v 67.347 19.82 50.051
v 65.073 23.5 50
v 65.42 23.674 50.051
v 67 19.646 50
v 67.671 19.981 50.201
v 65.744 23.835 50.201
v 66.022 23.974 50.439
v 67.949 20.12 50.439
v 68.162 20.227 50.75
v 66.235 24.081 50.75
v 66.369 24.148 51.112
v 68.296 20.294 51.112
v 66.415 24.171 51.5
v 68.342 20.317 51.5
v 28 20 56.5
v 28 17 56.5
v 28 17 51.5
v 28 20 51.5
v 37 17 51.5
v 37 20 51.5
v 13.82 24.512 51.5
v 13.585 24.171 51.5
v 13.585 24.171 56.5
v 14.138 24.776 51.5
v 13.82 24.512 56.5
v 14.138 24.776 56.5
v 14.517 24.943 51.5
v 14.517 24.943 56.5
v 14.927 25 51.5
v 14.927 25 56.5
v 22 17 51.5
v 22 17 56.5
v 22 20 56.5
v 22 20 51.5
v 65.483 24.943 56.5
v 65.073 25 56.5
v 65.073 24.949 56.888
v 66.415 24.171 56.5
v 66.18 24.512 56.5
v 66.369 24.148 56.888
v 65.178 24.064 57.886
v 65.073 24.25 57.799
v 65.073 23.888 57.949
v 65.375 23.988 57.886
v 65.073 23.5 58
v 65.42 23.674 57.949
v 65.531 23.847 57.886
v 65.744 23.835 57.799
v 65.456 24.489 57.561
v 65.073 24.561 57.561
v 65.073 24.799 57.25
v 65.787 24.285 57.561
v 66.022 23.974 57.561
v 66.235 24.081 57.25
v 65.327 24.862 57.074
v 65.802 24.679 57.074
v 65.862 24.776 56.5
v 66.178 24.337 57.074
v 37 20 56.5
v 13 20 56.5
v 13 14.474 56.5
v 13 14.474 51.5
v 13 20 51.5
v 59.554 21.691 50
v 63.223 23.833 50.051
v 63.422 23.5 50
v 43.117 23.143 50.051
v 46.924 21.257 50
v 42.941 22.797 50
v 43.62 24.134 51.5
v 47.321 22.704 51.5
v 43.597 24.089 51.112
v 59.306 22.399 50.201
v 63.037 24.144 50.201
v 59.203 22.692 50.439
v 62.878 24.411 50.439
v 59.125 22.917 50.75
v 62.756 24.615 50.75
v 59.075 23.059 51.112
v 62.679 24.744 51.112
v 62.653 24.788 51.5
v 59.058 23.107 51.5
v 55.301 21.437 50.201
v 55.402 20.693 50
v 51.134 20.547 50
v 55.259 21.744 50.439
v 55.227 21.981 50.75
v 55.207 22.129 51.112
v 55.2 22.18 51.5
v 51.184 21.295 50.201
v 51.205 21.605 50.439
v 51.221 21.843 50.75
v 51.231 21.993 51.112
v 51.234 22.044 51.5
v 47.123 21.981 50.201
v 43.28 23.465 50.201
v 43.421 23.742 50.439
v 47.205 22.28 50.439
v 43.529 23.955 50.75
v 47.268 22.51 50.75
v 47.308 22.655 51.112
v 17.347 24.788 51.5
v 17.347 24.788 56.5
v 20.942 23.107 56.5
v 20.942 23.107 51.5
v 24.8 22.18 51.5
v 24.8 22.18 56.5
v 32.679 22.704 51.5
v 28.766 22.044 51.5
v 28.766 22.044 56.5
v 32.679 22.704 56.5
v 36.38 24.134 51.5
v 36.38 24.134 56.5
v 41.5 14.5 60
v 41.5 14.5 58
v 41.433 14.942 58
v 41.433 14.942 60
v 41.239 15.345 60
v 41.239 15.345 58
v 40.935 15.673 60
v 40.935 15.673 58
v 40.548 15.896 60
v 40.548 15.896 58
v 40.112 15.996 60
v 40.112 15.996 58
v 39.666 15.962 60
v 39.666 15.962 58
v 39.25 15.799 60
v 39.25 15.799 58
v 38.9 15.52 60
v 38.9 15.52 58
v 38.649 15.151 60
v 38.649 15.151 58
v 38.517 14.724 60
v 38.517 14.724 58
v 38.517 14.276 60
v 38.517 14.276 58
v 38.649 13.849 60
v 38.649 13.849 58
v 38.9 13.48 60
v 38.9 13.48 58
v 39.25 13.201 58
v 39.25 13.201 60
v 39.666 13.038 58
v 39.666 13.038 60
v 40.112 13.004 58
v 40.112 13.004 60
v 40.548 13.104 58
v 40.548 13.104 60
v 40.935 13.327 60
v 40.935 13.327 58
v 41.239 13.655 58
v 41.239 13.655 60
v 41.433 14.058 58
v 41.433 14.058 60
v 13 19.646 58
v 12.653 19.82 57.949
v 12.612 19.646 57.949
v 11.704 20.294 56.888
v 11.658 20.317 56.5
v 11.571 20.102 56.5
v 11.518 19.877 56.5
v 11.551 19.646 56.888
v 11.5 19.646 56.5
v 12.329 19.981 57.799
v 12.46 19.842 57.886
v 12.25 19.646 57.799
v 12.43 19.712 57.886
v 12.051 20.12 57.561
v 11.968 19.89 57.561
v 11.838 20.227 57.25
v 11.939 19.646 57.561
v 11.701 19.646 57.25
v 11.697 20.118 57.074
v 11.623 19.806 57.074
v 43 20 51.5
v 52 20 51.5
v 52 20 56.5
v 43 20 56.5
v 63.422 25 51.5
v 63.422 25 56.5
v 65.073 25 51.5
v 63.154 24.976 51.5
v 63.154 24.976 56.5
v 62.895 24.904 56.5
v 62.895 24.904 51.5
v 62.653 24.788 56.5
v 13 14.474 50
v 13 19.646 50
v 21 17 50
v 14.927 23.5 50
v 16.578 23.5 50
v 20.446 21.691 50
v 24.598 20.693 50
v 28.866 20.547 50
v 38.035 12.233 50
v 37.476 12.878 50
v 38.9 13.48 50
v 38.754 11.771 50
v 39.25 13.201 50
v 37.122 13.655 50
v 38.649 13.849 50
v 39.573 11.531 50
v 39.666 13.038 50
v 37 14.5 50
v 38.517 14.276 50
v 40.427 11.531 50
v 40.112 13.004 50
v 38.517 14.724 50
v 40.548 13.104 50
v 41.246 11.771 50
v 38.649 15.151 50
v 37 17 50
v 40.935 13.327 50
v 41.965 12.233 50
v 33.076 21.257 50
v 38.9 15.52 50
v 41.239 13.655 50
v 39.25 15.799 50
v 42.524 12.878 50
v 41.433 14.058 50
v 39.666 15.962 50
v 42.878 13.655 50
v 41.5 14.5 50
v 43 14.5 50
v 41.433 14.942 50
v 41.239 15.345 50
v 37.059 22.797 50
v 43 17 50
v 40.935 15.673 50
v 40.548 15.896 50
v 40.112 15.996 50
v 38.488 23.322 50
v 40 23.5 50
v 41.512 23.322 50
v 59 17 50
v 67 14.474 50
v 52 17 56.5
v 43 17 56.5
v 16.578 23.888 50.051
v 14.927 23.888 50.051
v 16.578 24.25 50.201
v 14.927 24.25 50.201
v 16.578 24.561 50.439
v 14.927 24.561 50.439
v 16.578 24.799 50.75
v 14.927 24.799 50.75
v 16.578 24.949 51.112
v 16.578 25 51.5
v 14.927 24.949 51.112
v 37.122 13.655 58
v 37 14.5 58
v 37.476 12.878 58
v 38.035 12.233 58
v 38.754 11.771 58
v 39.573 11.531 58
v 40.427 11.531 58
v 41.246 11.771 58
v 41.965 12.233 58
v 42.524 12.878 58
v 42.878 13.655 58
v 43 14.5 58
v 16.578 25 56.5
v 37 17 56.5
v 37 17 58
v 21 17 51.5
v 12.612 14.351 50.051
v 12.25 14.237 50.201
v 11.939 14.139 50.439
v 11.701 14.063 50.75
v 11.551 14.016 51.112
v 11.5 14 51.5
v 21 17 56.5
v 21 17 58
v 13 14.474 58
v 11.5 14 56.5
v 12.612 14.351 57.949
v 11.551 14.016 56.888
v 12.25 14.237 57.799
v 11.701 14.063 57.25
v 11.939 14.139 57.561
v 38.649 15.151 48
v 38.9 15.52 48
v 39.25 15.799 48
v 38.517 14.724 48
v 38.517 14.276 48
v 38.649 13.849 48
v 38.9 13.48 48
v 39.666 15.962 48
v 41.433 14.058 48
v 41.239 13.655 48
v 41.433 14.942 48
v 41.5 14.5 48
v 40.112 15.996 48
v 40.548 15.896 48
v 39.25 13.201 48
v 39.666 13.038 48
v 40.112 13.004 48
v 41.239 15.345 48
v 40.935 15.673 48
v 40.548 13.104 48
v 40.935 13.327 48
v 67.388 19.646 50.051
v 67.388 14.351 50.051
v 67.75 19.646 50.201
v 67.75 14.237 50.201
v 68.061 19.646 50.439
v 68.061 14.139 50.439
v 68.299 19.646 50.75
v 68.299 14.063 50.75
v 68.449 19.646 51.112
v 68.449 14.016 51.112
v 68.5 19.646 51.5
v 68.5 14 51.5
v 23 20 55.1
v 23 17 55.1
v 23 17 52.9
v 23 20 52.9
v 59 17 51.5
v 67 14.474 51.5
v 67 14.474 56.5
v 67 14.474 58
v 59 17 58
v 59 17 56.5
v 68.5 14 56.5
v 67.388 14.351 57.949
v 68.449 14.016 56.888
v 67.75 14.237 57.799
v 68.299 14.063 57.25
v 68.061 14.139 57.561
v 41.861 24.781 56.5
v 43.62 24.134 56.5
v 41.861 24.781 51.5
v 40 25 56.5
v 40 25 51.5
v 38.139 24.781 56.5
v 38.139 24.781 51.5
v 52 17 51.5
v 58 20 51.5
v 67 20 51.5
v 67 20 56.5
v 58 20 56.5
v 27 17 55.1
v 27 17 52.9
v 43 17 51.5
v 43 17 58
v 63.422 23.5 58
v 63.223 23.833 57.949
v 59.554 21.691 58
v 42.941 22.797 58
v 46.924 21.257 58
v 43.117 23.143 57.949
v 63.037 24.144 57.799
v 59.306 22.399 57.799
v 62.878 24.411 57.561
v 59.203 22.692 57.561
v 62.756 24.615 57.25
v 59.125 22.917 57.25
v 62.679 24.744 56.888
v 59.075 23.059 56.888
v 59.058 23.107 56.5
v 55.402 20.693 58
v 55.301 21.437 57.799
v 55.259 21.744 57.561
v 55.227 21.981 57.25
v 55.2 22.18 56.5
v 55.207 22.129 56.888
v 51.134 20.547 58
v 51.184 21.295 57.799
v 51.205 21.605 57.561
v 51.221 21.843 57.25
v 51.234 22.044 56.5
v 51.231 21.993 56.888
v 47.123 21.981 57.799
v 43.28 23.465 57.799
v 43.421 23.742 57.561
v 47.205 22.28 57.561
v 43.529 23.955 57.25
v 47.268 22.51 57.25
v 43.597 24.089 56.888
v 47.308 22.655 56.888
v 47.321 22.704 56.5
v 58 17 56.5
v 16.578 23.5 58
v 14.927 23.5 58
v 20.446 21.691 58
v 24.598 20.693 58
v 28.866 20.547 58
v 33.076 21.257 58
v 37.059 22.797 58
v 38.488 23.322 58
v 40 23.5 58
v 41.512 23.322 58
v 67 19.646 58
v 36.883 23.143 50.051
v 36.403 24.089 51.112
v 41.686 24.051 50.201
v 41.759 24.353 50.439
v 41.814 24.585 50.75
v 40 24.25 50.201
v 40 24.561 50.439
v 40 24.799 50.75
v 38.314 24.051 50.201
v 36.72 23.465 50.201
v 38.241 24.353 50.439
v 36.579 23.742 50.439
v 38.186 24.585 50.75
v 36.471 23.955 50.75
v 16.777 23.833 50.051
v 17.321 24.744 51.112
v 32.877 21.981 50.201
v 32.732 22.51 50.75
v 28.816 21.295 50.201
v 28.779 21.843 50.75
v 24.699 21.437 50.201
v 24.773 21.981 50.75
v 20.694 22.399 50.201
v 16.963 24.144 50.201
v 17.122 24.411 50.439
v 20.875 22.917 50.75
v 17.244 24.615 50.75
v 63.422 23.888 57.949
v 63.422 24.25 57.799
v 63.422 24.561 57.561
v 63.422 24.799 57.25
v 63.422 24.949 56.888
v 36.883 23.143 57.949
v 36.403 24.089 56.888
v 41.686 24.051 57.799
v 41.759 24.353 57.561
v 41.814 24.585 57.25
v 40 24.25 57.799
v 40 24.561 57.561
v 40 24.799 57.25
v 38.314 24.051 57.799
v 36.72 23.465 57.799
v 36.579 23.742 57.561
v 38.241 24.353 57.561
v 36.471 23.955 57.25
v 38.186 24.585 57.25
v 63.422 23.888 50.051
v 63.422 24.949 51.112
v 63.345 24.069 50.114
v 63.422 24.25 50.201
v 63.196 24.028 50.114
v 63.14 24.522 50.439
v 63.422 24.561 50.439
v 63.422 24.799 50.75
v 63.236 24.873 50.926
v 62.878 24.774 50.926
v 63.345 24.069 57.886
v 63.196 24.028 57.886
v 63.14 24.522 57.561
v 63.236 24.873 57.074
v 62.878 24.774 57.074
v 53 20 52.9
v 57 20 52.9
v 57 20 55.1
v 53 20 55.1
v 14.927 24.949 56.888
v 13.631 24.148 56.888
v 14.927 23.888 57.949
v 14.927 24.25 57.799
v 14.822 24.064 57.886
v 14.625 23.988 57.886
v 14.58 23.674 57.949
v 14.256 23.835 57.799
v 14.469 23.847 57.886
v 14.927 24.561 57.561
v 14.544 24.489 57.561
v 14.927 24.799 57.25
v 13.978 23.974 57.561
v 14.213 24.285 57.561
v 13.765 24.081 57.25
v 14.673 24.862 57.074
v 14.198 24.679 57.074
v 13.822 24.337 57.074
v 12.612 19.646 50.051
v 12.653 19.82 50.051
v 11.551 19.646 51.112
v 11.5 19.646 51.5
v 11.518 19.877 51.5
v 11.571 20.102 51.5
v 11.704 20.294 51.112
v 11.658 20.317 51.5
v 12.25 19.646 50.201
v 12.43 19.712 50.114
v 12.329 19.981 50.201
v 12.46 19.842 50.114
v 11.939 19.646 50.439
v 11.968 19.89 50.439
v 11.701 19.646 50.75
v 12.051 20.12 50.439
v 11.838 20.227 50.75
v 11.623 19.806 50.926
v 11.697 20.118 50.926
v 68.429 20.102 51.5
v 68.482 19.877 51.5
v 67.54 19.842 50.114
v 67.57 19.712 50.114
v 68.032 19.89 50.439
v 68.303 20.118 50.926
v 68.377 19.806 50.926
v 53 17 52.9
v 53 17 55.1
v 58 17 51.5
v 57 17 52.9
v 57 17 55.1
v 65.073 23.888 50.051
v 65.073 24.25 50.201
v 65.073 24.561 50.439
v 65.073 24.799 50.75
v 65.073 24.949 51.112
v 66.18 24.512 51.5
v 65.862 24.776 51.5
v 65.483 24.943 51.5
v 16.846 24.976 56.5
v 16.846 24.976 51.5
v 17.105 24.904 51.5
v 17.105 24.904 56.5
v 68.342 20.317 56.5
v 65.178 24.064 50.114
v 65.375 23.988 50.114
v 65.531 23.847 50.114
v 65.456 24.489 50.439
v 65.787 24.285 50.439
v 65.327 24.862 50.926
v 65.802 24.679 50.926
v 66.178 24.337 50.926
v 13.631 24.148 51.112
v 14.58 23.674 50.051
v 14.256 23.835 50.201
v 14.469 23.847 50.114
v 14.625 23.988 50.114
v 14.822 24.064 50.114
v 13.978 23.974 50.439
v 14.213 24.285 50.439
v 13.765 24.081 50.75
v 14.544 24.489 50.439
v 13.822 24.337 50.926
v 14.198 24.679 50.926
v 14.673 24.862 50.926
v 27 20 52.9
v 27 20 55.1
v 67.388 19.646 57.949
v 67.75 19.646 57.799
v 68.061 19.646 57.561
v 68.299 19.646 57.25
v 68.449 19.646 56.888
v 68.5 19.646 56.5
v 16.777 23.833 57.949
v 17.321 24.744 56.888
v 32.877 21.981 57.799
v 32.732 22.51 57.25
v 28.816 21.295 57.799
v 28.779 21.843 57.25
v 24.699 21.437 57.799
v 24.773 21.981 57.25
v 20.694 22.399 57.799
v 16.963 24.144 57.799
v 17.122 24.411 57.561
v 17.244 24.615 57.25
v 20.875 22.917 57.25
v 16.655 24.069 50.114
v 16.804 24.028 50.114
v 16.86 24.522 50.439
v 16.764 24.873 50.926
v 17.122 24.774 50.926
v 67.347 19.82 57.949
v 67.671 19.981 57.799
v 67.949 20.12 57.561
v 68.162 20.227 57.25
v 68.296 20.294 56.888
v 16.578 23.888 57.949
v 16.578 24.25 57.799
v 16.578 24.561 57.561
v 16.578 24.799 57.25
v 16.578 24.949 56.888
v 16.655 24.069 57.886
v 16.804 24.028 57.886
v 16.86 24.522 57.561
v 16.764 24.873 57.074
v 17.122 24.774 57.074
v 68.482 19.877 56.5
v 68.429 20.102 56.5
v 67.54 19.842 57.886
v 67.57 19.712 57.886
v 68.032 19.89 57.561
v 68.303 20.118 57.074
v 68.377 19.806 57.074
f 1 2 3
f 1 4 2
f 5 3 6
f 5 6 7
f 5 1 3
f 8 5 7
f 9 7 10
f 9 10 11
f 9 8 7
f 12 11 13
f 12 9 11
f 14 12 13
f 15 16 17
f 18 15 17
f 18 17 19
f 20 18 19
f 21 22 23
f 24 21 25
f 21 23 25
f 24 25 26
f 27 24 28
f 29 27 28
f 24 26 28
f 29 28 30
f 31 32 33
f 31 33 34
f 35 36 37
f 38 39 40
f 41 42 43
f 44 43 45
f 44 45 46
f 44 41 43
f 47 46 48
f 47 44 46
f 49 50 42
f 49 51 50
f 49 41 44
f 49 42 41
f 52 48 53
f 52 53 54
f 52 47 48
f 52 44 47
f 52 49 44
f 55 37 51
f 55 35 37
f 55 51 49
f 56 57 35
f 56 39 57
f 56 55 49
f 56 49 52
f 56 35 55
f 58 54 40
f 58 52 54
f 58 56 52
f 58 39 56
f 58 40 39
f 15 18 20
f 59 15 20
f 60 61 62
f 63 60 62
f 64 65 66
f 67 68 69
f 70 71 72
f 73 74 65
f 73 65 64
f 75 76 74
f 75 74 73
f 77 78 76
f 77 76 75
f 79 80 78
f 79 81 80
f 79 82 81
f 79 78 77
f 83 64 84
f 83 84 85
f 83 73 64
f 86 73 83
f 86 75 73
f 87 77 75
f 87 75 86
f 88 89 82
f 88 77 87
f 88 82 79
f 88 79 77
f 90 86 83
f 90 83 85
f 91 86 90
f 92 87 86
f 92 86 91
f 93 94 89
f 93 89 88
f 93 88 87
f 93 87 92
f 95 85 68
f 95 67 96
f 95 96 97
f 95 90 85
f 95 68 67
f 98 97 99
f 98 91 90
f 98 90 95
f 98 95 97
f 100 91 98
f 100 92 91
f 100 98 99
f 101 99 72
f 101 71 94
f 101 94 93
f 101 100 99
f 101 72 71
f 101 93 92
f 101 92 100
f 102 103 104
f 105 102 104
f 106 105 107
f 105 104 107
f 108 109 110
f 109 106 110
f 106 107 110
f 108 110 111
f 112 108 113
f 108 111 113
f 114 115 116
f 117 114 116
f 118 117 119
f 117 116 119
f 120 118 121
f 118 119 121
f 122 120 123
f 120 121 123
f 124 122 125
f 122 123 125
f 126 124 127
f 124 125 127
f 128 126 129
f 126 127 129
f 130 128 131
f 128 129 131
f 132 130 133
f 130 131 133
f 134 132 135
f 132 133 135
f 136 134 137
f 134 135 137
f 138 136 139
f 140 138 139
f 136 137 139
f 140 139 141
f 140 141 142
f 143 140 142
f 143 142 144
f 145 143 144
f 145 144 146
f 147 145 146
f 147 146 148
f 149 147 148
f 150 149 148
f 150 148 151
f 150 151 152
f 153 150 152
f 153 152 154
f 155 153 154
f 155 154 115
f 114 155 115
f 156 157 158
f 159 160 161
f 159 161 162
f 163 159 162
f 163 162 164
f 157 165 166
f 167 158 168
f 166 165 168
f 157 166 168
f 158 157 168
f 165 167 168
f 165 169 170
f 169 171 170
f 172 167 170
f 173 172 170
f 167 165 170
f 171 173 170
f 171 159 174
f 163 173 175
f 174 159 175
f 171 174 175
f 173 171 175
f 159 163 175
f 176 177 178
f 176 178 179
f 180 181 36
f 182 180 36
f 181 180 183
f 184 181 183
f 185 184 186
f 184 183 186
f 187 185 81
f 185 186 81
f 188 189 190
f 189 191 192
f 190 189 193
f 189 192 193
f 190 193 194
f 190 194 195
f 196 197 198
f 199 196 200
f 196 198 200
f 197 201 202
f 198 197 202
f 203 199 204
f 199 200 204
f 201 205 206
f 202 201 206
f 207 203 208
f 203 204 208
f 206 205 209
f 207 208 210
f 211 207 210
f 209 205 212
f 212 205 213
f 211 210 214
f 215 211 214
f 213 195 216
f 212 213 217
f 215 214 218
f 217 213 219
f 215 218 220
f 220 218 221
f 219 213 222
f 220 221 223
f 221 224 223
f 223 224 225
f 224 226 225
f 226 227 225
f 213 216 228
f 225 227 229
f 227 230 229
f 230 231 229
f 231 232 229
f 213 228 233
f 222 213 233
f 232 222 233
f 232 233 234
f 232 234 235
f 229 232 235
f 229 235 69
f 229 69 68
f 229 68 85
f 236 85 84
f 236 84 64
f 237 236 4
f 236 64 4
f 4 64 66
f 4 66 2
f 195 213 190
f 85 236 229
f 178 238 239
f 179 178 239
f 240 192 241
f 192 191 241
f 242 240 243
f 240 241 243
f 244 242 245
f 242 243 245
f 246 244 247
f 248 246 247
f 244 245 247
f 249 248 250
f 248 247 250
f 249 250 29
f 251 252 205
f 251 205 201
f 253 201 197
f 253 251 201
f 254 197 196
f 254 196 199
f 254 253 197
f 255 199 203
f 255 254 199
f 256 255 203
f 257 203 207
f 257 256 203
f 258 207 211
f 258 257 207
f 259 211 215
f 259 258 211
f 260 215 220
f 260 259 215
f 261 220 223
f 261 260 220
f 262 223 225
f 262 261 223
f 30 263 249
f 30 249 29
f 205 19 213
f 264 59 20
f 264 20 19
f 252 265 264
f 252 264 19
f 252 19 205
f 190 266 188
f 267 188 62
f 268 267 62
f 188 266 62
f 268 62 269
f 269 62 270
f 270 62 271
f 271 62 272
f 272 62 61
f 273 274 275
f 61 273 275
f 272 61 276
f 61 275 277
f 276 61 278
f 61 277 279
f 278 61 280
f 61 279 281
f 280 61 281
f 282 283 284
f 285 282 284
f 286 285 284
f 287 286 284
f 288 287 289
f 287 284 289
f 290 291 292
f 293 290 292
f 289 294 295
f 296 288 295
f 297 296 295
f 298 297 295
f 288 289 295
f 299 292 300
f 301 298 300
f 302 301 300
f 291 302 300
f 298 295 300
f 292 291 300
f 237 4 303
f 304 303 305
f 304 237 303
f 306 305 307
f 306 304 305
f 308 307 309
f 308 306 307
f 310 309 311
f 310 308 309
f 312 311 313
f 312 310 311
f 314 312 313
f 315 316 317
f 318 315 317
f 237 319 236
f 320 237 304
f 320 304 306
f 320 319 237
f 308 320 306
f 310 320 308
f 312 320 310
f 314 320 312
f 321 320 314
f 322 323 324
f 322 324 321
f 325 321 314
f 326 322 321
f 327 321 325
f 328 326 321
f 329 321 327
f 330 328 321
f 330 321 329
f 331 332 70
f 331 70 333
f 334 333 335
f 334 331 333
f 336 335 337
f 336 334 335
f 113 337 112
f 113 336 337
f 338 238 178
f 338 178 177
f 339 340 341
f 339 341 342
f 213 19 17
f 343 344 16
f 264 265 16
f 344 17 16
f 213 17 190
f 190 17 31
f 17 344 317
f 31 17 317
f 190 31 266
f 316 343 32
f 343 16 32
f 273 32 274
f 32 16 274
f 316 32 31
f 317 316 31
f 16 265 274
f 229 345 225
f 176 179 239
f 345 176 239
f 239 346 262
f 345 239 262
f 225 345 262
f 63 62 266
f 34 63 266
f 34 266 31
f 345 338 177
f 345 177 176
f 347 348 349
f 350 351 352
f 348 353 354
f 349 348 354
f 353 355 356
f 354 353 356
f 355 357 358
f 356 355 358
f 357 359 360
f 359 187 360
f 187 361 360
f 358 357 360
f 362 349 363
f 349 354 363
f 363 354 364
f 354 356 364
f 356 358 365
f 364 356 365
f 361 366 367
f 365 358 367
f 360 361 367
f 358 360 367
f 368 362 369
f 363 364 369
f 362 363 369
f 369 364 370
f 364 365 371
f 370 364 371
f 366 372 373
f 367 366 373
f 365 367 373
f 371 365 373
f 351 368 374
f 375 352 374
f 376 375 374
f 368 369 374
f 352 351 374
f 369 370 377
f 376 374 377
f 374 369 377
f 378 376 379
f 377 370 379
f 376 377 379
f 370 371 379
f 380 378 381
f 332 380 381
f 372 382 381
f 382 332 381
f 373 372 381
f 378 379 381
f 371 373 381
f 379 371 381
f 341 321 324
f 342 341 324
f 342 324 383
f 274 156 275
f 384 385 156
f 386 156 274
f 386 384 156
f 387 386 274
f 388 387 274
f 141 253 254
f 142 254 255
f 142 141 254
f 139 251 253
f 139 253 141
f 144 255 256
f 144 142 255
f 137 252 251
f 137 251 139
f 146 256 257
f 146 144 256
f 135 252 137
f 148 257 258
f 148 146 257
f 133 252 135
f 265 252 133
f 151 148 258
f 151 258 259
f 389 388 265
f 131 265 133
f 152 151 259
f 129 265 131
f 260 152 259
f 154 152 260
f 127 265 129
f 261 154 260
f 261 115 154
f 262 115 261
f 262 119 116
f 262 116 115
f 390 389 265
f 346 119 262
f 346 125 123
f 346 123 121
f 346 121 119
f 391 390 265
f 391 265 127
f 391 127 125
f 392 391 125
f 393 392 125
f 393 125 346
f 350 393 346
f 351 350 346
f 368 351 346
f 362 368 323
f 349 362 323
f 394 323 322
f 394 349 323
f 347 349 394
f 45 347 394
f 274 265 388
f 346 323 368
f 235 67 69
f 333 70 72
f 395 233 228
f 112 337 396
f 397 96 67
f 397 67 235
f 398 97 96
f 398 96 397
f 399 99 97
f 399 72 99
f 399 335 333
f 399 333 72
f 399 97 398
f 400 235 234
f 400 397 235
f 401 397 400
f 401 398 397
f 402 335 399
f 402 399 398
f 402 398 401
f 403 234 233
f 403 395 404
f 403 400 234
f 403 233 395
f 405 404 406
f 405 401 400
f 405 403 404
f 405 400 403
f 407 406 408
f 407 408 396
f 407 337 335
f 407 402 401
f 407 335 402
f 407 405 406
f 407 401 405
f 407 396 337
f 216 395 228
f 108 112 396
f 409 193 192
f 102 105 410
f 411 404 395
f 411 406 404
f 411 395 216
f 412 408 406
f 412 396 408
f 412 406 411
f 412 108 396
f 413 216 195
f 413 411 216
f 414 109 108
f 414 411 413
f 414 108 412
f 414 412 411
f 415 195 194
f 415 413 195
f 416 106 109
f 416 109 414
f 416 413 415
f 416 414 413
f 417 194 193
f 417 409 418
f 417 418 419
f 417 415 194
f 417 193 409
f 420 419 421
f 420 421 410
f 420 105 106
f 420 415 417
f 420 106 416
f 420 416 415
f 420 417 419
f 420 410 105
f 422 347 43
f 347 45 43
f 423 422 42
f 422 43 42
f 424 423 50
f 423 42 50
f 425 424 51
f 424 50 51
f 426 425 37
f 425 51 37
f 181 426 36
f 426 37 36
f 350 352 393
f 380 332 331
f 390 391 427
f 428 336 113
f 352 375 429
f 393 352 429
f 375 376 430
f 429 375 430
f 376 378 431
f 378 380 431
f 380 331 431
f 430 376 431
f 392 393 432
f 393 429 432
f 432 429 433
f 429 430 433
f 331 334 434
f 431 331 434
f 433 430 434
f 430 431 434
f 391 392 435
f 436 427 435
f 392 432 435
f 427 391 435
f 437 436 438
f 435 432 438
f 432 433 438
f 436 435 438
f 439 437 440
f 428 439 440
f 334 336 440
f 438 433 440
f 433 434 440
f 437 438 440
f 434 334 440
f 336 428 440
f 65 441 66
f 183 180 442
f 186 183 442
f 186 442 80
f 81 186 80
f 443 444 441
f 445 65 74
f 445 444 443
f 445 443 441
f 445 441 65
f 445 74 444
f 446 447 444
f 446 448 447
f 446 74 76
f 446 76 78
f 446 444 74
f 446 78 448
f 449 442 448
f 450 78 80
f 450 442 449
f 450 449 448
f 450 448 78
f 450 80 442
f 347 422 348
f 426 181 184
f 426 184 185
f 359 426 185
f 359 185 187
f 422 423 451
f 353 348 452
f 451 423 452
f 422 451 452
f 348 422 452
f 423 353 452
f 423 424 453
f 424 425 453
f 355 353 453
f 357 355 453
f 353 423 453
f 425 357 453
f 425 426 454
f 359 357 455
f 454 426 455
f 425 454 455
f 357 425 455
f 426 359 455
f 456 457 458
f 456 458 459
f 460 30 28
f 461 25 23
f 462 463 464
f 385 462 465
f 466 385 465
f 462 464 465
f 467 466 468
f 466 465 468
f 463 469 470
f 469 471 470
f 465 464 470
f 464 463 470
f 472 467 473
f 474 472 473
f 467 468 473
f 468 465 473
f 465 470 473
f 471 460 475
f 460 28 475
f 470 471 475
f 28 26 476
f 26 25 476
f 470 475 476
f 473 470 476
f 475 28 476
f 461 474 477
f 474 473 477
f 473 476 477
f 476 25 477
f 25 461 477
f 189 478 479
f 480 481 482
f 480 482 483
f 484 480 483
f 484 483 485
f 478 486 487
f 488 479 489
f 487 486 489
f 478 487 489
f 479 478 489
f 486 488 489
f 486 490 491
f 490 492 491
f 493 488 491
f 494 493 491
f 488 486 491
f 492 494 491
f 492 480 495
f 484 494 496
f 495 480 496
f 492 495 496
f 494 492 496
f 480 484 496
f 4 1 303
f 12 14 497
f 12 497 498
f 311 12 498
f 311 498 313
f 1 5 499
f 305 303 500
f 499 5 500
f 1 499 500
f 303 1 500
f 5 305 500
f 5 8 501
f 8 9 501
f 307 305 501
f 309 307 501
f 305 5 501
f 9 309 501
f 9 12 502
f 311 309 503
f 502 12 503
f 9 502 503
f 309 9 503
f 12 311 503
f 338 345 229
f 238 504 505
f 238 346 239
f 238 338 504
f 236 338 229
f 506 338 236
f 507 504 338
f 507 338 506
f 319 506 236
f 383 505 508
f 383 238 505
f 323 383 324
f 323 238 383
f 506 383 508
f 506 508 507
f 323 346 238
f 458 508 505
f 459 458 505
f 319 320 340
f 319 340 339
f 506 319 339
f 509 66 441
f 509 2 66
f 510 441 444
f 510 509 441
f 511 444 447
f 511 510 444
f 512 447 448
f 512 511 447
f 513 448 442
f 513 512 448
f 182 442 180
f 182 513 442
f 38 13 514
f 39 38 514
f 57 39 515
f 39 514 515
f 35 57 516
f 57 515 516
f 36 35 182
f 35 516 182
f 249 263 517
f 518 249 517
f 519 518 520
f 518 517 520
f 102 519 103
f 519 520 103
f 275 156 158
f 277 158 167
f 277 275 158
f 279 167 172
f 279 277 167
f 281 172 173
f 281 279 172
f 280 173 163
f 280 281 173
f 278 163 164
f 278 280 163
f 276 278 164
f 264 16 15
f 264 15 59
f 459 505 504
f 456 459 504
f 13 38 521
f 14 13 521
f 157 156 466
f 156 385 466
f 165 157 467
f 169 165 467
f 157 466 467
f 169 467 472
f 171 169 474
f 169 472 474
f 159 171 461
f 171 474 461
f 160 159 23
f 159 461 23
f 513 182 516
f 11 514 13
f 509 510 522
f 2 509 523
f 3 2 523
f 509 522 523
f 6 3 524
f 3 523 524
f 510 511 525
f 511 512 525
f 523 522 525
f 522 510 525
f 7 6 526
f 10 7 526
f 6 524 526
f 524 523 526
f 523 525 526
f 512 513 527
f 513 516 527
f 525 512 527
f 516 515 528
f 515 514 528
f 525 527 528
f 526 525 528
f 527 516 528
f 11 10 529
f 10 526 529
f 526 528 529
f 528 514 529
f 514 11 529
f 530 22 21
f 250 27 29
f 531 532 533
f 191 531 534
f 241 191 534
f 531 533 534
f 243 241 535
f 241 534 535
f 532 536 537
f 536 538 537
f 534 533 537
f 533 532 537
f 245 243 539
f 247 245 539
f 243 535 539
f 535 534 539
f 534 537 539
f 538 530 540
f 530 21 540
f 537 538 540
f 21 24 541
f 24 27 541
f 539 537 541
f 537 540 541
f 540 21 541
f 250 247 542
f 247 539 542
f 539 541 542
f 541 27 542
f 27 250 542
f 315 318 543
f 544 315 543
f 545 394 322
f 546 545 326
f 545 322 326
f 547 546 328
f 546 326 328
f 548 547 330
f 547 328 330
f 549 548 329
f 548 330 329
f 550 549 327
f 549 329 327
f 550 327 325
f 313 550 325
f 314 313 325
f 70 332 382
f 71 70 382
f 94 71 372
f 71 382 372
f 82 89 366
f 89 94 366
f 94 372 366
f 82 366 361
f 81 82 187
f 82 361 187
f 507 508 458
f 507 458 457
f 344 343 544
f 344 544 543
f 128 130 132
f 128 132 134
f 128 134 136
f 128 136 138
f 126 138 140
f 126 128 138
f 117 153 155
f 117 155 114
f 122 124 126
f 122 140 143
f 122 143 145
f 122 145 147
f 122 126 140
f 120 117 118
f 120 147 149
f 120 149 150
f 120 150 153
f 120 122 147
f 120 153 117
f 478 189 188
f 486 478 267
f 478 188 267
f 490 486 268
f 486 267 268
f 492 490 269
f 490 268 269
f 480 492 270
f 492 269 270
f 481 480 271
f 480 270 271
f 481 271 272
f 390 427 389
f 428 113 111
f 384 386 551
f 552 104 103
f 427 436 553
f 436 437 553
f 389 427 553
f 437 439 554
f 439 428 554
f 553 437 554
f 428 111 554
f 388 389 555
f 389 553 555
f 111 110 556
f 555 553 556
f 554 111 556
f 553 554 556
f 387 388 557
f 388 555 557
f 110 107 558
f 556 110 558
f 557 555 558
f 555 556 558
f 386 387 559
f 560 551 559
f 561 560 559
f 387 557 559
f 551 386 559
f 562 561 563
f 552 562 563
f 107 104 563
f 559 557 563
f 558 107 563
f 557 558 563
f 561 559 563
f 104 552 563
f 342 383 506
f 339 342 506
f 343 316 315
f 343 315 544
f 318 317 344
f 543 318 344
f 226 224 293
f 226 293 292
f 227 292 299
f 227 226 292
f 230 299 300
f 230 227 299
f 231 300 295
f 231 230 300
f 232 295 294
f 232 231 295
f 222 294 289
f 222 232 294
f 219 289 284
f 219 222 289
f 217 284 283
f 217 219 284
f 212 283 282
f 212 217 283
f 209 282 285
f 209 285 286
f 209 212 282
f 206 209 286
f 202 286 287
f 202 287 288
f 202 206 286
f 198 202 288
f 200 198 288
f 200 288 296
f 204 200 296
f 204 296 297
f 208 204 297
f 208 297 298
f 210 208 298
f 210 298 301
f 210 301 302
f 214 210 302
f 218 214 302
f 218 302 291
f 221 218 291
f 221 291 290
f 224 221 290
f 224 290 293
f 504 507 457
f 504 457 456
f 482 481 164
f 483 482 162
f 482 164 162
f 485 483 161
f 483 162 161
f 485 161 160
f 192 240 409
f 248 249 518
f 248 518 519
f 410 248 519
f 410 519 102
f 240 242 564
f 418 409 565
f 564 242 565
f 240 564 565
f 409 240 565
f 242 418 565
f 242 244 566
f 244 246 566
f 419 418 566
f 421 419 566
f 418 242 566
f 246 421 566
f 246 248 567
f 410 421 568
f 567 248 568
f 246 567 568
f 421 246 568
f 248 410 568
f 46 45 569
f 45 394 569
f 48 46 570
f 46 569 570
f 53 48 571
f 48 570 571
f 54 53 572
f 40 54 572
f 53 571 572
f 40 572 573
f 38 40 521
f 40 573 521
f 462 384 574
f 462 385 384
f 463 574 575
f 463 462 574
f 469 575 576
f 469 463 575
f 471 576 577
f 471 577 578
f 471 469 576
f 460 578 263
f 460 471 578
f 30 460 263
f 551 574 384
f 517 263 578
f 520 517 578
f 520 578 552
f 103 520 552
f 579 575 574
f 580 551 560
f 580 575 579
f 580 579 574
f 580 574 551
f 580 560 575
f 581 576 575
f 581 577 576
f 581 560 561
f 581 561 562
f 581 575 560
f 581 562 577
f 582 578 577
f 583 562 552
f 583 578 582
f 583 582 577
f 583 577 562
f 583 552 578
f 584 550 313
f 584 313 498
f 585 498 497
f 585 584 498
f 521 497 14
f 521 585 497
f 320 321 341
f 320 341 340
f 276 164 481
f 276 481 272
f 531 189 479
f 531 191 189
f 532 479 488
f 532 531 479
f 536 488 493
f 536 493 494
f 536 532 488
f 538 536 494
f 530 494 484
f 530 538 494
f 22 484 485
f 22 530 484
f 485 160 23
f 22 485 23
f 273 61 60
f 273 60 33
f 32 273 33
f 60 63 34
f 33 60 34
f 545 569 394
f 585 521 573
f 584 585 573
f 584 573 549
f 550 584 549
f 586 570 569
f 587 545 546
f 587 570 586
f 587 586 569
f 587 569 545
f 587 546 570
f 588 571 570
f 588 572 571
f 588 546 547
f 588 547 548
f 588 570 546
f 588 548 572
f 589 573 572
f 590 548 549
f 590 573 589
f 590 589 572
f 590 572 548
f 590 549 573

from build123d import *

# Parameters (mm, degrees)
PAD060_DEPTH            = 4
CYLINDER_R              = 1.5
CYLINDER_DEPTH          = 6
SKETCH098_W             = 9
SKETCH098_H             = 5
SKETCH098_W_2           = 4
SKETCH098_H_2           = 2.2
POCKET027_DEPTH         = 6
FILLET003_R             = 1.5
BODY091_PLACEMENT_ANGLE = 90


with BuildPart() as part:
    # Sketch097 → Pad060 (new body, symmetric)
    with BuildSketch(Plane.XZ):
        with BuildLine():
            ThreePointArc((3.619641, 7.134297), (0, 8), (-3.619641, 7.134297))
            ThreePointArc((-23, 8), (-13.423615, 5.019648), (-3.619641, 7.134297))
            Line((-23, 8), (-26, 8))
            Line((-28.5, 3), (-26, 8))
            Line((-28.5, 3), (-28.5, -3))
            Line((-19, 0), (-28.5, -3))
            Line((-3, 0), (-19, 0))
            Line((-3, 0), (-3, -2.5))
            ThreePointArc((-3, -2.5), (0, -5.5), (3, -2.5))
            Line((3, 0), (3, -2.5))
            Line((3, 0), (19, 0))
            Line((19, 0), (28.5, -3))
            Line((28.5, 3), (28.5, -3))
            Line((26, 8), (28.5, 3))
            Line((23, 8), (26, 8))
            ThreePointArc((3.619641, 7.134297), (13.423615, 5.019648), (23, 8))
        make_face()
    extrude(amount=PAD060_DEPTH, both=True)

    # Cylinder → Cylinder (join)
    with BuildSketch(Plane(origin=(0, 0, -2.5), x_dir=(1, 0, 0), z_dir=(0, -1, 0))):
        Circle(CYLINDER_R)
    cylinder = extrude(amount=CYLINDER_DEPTH)

    # Mirrored015: Cylinder across XZ
    add(cylinder.mirror(Plane.XZ))

    # Sketch098 → Pocket027 (cut)
    with BuildSketch(Plane.XY.offset(-3)):
        with Locations((-22.5, 0)):
            Rectangle(SKETCH098_W, SKETCH098_H)
        with Locations((-7.5, 0)):
            Rectangle(SKETCH098_W, SKETCH098_H)
        with Locations((-15, 0)):
            Rectangle(SKETCH098_W_2, SKETCH098_H_2)
    pocket027 = extrude(amount=POCKET027_DEPTH, mode=Mode.SUBTRACT)

    # Mirrored021: Pocket027 across YZ
    add(pocket027.mirror(Plane.YZ), mode=Mode.SUBTRACT)

    # Fillet003
    fillet003_edges = [part.edges().sort_by_distance(p)[0] for p in [
        (0, 4, 8),
        (0, -4, 8),
        (-23, 0, 8),
        (-26, 0, 8),
        (-28.5, 0, 3),
        (-28.5, 4, 0),
        (-27.25, 4, 5.5),
        (-24.5, 4, 8),
        (-13.423615, 4, 5.019648),
        (-13.423615, -4, 5.019648),
        (-24.5, -4, 8),
        (-27.25, -4, 5.5),
        (-28.5, -4, 0),
        (13.423615, -4, 5.019648),
        (13.423615, 4, 5.019648),
        (23, 0, 8),
        (26, 0, 8),
        (24.5, -4, 8),
        (24.5, 4, 8),
        (27.25, -4, 5.5),
        (28.5, -4, 0),
        (27.25, 4, 5.5),
        (28.5, 4, 0),
        (28.5, 0, 3),
    ]]
    fillet(fillet003_edges, radius=FILLET003_R)


with BuildPart() as part_1:
    # Body091 placement: moved
    add(part.part.moved(Location((40, 17, 54))).rotate(Axis((40, 17, 54), (-1, 0, 0)), BODY091_PLACEMENT_ANGLE))


solid = part_1.part
